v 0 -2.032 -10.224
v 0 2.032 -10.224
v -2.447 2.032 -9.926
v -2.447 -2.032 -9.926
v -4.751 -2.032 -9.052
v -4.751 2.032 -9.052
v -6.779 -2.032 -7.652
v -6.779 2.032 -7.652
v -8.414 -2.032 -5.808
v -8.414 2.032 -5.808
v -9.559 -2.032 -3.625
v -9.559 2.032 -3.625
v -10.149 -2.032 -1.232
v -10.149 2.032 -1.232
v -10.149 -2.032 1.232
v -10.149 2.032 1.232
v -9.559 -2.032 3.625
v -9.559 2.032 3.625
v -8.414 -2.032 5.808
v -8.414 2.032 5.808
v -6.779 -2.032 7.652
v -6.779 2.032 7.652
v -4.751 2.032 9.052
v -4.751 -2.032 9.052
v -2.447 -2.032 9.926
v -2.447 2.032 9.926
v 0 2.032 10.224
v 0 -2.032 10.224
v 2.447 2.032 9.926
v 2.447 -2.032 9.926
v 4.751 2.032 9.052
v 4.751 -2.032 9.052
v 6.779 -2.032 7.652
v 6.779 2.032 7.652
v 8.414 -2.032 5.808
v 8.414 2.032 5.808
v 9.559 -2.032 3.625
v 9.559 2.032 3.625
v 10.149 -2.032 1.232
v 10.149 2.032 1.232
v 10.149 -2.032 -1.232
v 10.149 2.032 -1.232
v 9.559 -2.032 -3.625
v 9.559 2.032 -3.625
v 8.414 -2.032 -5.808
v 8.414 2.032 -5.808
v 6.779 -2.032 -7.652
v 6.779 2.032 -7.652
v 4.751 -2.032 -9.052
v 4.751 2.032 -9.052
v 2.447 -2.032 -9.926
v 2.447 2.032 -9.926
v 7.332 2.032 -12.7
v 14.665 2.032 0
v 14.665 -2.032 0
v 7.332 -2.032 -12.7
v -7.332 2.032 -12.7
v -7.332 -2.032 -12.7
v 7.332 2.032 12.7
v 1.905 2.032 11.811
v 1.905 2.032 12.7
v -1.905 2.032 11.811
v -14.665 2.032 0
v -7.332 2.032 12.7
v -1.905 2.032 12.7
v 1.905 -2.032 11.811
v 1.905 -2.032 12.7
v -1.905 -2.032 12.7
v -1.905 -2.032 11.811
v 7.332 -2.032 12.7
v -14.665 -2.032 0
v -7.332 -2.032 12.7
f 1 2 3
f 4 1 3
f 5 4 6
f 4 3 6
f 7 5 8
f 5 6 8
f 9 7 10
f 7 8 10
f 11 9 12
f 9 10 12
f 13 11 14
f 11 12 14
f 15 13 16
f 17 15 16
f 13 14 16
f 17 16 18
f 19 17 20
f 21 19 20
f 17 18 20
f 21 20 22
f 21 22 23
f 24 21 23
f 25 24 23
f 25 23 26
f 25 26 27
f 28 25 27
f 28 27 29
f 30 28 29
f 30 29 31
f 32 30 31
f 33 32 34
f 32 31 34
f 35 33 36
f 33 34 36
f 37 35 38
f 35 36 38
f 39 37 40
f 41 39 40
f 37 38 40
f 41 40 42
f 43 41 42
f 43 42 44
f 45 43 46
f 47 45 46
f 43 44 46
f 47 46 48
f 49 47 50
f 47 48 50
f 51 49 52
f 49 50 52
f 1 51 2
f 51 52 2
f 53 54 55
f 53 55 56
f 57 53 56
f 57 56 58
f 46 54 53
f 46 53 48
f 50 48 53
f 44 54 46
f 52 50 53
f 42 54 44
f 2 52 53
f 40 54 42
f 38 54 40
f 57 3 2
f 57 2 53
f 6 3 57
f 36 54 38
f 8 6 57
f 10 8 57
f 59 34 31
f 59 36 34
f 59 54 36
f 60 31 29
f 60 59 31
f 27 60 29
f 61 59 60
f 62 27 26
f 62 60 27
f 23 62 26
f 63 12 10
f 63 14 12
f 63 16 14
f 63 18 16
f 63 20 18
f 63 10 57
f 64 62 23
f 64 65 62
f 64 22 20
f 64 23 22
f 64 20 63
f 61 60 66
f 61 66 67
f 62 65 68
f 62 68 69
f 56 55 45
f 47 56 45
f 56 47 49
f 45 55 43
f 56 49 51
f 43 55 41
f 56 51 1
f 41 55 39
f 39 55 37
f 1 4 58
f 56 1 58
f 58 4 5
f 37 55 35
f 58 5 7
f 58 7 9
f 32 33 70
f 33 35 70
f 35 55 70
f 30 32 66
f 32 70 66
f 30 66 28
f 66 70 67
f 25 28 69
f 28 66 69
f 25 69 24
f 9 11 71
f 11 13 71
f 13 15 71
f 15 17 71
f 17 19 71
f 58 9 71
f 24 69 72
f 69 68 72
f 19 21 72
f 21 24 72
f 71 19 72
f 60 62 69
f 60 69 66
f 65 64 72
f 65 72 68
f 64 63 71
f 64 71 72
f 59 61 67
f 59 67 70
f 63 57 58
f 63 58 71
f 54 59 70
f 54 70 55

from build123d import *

# Parameters (mm, degrees)
SKETCH1_R           = 10.2235
BOSS_EXTRUDE1_DEPTH = 4.064


with BuildPart() as part:
    # Sketch1 → Boss-Extrude1 (new body)
    with BuildSketch(Plane(origin=(0, 2.032, 0), x_dir=(-1, 0, 0), z_dir=(0, 1, 0))):
        Polygon((1.905, 12.7), (1.905, 11.811), (-1.905, 11.811), (-1.905, 12.7), (-7.332348419, 12.7), (-14.664696837, 0), (-7.332348419, -12.7), (7.332348419, -12.7), (14.664696837, 0), (7.332348419, 12.7), align=None)
        with Locations(Location((0, 0, 0), (0, 0, 270))):
            Circle(SKETCH1_R, mode=Mode.SUBTRACT)
    extrude(amount=-BOSS_EXTRUDE1_DEPTH)


solid = part.part
